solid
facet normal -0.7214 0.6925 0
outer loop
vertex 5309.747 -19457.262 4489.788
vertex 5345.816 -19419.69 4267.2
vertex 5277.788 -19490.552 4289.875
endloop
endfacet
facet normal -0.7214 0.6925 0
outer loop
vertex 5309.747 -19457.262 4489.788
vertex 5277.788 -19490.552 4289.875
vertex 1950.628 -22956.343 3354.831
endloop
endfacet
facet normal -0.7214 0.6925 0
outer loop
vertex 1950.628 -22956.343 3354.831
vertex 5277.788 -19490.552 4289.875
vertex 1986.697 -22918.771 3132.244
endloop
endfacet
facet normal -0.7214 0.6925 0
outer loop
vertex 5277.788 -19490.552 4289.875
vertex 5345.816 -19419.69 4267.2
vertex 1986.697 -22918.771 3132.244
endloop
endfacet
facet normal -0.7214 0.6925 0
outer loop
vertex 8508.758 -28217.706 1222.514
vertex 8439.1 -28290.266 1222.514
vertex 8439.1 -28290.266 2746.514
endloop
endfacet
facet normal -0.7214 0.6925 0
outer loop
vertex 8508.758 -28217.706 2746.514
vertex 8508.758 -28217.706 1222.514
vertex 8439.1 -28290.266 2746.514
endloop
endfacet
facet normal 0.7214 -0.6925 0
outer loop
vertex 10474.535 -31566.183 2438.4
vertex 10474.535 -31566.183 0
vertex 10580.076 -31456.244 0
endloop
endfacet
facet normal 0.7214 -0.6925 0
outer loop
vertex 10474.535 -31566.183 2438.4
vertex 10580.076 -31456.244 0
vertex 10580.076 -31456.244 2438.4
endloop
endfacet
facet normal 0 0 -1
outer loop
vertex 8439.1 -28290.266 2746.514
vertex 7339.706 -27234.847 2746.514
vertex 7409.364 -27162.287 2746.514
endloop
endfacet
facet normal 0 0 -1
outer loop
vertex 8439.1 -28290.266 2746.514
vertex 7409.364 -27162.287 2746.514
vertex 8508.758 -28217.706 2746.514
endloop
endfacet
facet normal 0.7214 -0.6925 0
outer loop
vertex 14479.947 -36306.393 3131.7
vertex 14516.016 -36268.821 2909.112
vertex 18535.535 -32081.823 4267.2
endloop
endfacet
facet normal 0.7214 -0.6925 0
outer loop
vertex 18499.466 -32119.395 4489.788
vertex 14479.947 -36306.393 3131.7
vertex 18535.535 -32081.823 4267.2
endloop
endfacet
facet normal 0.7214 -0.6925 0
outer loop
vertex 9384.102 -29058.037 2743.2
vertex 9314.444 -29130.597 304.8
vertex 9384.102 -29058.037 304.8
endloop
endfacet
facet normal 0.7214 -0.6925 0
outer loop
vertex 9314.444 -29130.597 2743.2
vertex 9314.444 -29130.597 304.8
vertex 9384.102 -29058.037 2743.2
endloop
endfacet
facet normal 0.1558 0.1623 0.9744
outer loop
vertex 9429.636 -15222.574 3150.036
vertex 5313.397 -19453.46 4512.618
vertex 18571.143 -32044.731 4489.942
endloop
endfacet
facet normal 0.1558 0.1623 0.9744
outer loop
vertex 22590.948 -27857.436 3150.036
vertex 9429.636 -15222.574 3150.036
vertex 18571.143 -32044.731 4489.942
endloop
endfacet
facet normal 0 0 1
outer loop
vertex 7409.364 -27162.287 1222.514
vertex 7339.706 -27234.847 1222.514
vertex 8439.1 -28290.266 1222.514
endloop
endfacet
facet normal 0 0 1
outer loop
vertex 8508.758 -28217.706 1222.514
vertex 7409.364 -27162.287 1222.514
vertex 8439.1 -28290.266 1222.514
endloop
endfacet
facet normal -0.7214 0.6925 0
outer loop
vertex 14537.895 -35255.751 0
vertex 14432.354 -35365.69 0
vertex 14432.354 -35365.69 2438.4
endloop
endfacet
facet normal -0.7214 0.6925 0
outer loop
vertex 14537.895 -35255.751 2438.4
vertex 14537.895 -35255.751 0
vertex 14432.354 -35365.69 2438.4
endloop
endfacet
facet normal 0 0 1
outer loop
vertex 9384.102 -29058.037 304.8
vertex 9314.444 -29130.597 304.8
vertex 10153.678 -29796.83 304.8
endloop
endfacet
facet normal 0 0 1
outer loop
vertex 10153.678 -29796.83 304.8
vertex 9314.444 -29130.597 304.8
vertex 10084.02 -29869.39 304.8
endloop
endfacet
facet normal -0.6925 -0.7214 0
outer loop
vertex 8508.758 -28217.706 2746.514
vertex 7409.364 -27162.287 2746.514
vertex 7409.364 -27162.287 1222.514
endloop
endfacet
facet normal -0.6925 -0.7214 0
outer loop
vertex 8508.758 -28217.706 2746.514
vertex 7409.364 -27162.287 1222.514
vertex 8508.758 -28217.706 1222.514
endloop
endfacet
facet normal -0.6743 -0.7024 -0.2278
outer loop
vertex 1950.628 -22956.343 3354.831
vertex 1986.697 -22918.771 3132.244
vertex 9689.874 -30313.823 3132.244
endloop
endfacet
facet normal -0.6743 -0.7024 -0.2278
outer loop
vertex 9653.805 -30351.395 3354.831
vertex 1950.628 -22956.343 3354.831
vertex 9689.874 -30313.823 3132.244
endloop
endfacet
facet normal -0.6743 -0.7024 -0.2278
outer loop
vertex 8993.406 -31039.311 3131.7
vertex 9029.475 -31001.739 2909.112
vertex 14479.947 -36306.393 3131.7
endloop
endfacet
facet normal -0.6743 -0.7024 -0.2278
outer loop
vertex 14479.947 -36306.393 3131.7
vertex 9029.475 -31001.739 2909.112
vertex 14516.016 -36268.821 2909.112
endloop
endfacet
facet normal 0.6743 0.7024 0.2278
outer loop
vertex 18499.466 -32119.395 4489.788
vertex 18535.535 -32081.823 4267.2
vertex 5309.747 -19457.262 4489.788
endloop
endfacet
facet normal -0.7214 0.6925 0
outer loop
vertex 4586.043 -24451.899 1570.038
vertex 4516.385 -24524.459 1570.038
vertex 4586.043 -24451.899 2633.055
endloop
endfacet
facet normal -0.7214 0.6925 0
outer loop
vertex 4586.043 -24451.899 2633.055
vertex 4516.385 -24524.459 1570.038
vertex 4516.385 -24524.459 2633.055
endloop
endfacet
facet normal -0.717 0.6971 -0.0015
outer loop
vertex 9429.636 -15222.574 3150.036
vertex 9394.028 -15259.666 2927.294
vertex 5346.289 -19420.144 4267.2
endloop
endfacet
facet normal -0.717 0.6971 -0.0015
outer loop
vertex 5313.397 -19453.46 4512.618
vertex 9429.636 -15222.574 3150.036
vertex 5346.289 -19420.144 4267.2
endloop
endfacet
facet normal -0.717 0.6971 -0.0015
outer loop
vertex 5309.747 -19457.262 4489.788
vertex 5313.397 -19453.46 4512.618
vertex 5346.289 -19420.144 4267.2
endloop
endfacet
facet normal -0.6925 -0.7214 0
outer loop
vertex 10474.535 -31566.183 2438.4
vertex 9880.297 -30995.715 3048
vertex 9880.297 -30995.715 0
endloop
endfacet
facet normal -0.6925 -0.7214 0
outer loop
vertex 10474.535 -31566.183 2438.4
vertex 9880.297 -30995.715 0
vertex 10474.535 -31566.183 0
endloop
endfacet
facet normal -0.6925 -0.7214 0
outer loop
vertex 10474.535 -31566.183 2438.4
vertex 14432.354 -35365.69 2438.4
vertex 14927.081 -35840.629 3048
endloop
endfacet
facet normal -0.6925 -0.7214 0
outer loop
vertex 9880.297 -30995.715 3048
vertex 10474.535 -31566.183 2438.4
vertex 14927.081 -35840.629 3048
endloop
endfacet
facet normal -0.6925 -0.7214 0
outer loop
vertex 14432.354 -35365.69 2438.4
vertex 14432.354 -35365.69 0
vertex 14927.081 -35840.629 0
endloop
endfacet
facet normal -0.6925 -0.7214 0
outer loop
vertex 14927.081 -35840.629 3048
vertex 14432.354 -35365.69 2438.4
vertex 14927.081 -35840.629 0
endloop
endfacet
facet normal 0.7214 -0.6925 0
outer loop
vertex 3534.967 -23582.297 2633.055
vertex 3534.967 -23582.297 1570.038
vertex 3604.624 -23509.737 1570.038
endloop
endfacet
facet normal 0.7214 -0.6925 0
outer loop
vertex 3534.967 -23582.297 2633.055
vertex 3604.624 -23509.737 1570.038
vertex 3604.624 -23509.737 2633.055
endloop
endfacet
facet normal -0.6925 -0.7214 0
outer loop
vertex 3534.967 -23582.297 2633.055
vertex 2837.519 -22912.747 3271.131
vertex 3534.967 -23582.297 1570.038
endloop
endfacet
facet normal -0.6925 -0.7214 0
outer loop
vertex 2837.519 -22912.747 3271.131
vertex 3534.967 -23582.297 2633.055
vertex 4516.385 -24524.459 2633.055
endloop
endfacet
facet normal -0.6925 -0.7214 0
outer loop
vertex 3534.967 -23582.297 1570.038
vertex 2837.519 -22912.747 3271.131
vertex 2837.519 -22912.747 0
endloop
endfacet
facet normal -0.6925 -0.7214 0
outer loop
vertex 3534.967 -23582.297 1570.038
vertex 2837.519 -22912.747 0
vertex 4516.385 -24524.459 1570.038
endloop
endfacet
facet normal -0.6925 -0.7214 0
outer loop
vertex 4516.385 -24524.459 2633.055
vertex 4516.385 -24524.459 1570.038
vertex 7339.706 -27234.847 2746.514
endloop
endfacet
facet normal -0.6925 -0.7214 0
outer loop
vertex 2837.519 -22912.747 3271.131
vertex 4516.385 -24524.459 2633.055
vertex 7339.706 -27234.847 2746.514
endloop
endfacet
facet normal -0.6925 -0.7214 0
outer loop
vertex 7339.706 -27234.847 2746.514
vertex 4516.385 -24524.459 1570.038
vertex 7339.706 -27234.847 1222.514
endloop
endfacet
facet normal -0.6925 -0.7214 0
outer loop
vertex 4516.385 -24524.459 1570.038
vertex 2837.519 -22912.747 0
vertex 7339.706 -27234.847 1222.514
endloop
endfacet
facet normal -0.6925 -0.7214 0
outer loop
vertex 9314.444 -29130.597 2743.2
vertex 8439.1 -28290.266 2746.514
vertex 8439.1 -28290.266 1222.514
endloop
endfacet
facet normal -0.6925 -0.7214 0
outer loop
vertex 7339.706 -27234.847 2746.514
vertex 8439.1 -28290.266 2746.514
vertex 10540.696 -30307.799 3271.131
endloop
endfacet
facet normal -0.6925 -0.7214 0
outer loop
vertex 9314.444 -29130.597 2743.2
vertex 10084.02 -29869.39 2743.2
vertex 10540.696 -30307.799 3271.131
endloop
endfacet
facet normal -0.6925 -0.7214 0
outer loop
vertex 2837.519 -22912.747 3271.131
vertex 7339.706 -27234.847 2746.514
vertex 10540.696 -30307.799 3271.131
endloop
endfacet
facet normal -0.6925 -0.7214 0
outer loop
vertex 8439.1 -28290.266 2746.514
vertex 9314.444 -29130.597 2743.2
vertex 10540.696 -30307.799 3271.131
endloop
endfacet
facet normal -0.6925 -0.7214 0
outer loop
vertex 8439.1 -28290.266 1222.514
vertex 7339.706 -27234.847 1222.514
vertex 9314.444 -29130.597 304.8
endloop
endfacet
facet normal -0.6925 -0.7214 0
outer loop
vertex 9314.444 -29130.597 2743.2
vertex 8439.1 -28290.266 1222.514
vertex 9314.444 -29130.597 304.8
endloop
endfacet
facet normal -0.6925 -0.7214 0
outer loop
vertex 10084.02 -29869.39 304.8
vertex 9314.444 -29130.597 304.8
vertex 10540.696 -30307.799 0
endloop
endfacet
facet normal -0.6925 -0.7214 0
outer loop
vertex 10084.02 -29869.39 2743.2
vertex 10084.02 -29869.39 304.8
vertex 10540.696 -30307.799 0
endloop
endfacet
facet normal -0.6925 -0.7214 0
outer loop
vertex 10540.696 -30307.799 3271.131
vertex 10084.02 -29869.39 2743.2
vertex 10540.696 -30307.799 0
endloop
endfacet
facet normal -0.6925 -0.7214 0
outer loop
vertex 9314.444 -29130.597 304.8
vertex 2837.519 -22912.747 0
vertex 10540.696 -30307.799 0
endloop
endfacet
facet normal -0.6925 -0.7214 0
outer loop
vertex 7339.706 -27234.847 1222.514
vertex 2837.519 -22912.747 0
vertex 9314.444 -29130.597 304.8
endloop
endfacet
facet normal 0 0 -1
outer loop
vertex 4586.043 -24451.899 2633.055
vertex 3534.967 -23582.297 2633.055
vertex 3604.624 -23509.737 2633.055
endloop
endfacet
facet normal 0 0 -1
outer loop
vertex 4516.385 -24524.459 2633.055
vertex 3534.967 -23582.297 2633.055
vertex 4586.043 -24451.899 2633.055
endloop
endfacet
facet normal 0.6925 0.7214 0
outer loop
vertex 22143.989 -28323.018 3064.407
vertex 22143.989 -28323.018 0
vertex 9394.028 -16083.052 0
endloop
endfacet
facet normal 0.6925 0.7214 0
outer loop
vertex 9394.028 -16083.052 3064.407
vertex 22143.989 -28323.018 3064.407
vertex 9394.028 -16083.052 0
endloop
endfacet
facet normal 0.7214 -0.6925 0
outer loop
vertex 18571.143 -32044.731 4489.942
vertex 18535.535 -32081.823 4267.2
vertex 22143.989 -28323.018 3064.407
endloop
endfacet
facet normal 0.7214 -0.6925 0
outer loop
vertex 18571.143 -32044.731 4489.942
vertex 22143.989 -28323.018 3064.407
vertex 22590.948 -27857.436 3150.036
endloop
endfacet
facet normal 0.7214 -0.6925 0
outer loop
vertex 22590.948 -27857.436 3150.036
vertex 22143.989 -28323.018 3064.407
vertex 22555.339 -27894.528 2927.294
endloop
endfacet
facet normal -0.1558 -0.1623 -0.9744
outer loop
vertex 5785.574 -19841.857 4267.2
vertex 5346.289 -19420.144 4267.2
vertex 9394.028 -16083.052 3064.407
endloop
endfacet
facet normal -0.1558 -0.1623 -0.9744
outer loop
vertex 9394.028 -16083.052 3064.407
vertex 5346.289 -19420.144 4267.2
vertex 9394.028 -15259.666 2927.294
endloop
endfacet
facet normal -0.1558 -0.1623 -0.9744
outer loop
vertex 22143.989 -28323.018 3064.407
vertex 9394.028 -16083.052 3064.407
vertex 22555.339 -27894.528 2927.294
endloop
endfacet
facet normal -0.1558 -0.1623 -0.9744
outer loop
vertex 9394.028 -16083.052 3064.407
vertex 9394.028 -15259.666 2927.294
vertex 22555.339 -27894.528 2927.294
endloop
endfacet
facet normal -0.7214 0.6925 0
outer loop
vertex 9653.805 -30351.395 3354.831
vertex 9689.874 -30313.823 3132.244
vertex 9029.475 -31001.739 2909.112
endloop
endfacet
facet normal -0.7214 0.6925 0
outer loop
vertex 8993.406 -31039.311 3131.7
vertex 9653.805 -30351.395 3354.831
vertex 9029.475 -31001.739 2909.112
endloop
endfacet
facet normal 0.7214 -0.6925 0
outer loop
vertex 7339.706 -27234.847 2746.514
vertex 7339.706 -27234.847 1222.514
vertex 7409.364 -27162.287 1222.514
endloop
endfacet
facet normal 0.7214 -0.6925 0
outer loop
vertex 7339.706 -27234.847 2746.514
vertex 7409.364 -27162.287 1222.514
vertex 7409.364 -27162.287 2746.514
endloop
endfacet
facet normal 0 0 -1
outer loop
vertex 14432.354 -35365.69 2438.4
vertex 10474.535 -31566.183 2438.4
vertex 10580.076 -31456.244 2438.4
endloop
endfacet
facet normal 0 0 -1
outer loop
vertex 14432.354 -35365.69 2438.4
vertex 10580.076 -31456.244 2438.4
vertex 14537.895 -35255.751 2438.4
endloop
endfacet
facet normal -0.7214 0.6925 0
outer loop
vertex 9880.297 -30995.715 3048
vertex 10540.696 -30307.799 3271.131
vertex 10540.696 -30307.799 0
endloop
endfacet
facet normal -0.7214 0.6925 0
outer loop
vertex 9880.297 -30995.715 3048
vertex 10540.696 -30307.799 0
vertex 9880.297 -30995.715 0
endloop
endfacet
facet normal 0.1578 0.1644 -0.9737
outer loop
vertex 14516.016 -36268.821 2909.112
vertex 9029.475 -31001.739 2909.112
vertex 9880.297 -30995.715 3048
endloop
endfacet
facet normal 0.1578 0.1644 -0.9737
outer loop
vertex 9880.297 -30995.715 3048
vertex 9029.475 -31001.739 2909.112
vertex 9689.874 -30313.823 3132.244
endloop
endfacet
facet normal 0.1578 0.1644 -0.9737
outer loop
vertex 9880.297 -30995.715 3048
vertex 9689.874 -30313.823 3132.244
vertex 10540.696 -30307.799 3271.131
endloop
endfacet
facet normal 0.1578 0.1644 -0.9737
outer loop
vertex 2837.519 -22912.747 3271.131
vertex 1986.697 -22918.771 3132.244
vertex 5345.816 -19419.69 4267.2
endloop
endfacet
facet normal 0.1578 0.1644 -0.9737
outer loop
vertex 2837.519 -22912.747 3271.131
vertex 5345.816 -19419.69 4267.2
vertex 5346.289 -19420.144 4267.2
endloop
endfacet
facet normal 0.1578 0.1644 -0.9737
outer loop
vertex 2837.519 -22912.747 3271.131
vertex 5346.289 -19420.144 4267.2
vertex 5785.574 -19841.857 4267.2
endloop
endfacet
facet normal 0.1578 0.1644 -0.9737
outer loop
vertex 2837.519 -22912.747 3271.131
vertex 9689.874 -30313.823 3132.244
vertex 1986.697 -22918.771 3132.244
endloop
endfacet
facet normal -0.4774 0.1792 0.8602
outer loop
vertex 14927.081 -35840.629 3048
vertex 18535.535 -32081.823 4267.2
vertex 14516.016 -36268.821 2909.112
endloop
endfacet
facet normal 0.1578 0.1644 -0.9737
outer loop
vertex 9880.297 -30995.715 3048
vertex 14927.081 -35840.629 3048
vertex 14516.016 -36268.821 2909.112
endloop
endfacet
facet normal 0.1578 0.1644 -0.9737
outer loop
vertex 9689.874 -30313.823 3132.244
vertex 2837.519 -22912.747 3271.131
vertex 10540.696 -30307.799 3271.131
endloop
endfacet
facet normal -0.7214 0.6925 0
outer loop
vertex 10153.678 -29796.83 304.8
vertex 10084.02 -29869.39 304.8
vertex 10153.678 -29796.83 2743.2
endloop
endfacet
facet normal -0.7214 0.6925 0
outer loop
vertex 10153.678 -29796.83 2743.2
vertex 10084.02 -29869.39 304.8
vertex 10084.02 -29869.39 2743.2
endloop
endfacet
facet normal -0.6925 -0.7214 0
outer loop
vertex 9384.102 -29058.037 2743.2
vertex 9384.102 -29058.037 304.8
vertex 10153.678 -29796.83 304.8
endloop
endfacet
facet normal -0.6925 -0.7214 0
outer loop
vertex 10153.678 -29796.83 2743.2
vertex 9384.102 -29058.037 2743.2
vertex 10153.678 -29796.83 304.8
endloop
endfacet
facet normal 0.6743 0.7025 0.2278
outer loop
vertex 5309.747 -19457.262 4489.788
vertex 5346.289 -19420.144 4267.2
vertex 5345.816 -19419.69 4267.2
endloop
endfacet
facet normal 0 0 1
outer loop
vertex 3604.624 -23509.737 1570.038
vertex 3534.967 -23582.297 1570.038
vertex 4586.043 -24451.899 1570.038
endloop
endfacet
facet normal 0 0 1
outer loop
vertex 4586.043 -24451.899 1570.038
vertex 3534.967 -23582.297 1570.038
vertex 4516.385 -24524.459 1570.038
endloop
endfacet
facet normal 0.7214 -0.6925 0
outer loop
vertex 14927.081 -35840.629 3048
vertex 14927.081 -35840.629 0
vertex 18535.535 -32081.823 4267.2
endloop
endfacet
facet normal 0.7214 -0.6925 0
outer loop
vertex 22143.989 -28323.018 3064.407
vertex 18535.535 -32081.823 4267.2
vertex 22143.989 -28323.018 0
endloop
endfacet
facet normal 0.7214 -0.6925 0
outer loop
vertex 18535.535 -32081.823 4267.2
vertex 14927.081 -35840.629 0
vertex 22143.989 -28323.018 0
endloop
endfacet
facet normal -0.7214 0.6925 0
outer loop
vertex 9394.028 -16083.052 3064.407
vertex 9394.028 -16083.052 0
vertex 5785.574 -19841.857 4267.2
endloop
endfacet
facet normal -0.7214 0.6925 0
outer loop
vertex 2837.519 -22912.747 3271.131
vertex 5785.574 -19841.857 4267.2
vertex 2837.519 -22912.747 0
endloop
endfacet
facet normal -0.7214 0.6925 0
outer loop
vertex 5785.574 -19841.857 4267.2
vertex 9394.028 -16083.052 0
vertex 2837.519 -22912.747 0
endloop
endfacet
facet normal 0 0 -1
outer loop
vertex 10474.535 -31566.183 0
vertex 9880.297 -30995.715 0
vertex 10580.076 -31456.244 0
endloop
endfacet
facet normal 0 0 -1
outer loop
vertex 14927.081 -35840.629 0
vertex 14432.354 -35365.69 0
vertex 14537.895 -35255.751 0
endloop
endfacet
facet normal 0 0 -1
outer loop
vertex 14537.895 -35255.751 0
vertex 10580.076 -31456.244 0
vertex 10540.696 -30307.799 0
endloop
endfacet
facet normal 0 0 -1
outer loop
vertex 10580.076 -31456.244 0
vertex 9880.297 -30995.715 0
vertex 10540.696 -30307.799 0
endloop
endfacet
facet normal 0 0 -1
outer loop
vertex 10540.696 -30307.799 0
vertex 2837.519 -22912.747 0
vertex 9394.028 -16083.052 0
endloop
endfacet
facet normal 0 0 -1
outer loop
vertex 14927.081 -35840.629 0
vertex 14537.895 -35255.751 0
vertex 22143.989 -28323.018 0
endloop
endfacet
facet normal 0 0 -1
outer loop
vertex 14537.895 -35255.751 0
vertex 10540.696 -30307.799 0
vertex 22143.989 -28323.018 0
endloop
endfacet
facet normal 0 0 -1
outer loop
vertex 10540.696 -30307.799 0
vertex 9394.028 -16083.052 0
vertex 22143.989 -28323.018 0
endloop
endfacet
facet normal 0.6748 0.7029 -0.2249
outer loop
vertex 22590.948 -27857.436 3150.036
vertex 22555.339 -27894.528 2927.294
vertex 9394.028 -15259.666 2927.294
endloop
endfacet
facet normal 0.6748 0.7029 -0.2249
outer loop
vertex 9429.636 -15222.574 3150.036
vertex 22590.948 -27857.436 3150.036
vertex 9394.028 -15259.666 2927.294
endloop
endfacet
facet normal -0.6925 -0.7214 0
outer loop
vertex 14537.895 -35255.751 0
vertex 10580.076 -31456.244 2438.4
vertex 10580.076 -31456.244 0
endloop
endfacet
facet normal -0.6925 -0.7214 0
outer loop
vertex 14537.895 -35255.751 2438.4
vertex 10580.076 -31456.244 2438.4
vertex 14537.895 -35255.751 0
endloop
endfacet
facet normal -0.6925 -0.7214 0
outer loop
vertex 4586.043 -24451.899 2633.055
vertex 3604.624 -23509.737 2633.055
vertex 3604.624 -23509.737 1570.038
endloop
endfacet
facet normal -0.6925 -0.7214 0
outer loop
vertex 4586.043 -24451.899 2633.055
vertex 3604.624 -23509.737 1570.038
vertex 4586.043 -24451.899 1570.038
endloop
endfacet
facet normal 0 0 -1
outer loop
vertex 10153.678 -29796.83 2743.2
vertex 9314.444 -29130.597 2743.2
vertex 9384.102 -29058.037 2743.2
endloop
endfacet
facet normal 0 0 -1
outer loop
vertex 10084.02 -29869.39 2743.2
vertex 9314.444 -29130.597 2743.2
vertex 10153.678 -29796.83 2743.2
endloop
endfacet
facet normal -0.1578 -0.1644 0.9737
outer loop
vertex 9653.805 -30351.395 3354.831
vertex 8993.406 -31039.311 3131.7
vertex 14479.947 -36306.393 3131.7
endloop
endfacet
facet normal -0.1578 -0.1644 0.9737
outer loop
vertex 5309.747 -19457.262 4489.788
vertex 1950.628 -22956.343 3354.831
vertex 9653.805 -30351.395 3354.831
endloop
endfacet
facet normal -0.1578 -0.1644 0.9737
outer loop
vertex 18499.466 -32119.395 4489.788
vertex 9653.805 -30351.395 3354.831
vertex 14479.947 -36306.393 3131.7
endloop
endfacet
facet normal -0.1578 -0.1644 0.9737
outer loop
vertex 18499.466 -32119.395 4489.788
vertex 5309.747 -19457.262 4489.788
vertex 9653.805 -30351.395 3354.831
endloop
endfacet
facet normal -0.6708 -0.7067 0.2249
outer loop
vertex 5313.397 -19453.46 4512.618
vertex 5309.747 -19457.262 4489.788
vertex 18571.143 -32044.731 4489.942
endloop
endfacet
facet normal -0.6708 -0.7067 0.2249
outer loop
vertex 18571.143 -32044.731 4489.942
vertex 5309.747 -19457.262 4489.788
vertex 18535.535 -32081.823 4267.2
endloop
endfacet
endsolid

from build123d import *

# Parameters (mm, degrees)
F1_DEPTH  = 4267.2
F3_DEPTH  = 22404.0093298425
F4_W      = 5486.4
F4_H      = 2438.4
F5_DEPTH  = 152.4
F6_W      = 1066.8
F6_H      = 2438.4
F6_W_2    = 1524
F6_H_2    = 1524
F6_W_3    = 1360.4601135254
F6_H_3    = 1063.0166530609
F7_DEPTH  = 100.584
F9_DEPTH  = 228.6
F11_DEPTH = 228.6


with BuildPart() as f1:
    # F0 (on Top) → F1 (new body)
    with BuildSketch(Plane.XY):
        Polygon((22143.9891962815, -28323.0176376037), (9394.0277099609, -16083.0516815186), (2837.5189186279, -22912.7467047027), (10540.6964407008, -30307.7988956456), (9880.2969050223, -30995.7149140147), (14927.08086927, -35840.628679157), align=None)
    extrude(amount=F1_DEPTH)

    # F2 (on face) → F3 (cut, through all)
    with BuildSketch(Plane(origin=(25673.4394830699, -24646.5078020462, 0), x_dir=(0.6925319144, 0.7213872382, 0), z_dir=(0.7213872382, -0.6925319144, 0))):
        Polygon((-5096.4442406311, 4267.2), (-10306.968244332, 4267.2), (-5025.367095683, 3048), align=None)
        Polygon((-10306.968244332, 4267.2), (-15517.4922480328, 4267.2), (-15517.4922480328, 3048), align=None)
    extrude(amount=-F3_DEPTH, mode=Mode.SUBTRACT)

    # F4 (on face) → F5 (cut)
    with BuildSketch(Plane(origin=(-10746.3586137999, -11194.1208771108, 0), x_dir=(0.7213872382, -0.6925319144, 0), z_dir=(-0.6925319144, -0.7213872382, 0))):
        with Locations((32159.9848369854, 1219.2)):
            Rectangle(F4_W, F4_H)
    extrude(amount=-F5_DEPTH, mode=Mode.SUBTRACT)

    # F6 (on face) → F7 (cut)
    with BuildSketch(Plane(origin=(-10085.9590781215, -10506.2048587416, 0), x_dir=(0.7213872382, -0.6925319144, 0), z_dir=(-0.6925319144, -0.7213872382, 0))):
        with Locations((27426.589012146, 1524)):
            Rectangle(F6_W, F6_H)
        with Locations((24917.7712554932, 1984.513794899)):
            Rectangle(F6_W_2, F6_H_2)
        with Locations((19561.8027801514, 2101.5466451645)):
            Rectangle(F6_W_3, F6_H_3)
    extrude(amount=-F7_DEPTH, mode=Mode.SUBTRACT)

    # F8 (on face) → F9 (join)
    with BuildSketch(Plane(origin=(-1026.0984542937, -1068.8523007626, 6332.2155253973), x_dir=(0.9874739089, -0.0262615306, 0.155581526), z_dir=(-0.1577823793, -0.1643566058, 0.9736999676))):
        Polygon((10851.9047445382, -29369.6509092254), (10183.1280510822, -30085.1097214559), (15739.266370424, -35278.7221979155), (19809.7725017939, -30924.0855749234), (6452.7419740348, -18438.5720023167), (3051.0125361209, -22077.7498130783), align=None)
    extrude(amount=F9_DEPTH)

    # F10 (on face) → F11 (join)
    with BuildSketch(Plane(origin=(286.5449578876, 298.4842597009, 1792.4358695192), x_dir=(0.9877938033, -0.0255866872, -0.1536513049), z_dir=(0.1557671406, 0.1622573992, 0.9743762796))):
        Polygon((5052.9201327622, -19930.4707746463), (18474.4933741329, -32346.9859386226), (22543.9703278489, -27996.4721098459), (9220.0241803924, -15533.2335330653), align=None)
    extrude(amount=F11_DEPTH)


solid = f1.part
